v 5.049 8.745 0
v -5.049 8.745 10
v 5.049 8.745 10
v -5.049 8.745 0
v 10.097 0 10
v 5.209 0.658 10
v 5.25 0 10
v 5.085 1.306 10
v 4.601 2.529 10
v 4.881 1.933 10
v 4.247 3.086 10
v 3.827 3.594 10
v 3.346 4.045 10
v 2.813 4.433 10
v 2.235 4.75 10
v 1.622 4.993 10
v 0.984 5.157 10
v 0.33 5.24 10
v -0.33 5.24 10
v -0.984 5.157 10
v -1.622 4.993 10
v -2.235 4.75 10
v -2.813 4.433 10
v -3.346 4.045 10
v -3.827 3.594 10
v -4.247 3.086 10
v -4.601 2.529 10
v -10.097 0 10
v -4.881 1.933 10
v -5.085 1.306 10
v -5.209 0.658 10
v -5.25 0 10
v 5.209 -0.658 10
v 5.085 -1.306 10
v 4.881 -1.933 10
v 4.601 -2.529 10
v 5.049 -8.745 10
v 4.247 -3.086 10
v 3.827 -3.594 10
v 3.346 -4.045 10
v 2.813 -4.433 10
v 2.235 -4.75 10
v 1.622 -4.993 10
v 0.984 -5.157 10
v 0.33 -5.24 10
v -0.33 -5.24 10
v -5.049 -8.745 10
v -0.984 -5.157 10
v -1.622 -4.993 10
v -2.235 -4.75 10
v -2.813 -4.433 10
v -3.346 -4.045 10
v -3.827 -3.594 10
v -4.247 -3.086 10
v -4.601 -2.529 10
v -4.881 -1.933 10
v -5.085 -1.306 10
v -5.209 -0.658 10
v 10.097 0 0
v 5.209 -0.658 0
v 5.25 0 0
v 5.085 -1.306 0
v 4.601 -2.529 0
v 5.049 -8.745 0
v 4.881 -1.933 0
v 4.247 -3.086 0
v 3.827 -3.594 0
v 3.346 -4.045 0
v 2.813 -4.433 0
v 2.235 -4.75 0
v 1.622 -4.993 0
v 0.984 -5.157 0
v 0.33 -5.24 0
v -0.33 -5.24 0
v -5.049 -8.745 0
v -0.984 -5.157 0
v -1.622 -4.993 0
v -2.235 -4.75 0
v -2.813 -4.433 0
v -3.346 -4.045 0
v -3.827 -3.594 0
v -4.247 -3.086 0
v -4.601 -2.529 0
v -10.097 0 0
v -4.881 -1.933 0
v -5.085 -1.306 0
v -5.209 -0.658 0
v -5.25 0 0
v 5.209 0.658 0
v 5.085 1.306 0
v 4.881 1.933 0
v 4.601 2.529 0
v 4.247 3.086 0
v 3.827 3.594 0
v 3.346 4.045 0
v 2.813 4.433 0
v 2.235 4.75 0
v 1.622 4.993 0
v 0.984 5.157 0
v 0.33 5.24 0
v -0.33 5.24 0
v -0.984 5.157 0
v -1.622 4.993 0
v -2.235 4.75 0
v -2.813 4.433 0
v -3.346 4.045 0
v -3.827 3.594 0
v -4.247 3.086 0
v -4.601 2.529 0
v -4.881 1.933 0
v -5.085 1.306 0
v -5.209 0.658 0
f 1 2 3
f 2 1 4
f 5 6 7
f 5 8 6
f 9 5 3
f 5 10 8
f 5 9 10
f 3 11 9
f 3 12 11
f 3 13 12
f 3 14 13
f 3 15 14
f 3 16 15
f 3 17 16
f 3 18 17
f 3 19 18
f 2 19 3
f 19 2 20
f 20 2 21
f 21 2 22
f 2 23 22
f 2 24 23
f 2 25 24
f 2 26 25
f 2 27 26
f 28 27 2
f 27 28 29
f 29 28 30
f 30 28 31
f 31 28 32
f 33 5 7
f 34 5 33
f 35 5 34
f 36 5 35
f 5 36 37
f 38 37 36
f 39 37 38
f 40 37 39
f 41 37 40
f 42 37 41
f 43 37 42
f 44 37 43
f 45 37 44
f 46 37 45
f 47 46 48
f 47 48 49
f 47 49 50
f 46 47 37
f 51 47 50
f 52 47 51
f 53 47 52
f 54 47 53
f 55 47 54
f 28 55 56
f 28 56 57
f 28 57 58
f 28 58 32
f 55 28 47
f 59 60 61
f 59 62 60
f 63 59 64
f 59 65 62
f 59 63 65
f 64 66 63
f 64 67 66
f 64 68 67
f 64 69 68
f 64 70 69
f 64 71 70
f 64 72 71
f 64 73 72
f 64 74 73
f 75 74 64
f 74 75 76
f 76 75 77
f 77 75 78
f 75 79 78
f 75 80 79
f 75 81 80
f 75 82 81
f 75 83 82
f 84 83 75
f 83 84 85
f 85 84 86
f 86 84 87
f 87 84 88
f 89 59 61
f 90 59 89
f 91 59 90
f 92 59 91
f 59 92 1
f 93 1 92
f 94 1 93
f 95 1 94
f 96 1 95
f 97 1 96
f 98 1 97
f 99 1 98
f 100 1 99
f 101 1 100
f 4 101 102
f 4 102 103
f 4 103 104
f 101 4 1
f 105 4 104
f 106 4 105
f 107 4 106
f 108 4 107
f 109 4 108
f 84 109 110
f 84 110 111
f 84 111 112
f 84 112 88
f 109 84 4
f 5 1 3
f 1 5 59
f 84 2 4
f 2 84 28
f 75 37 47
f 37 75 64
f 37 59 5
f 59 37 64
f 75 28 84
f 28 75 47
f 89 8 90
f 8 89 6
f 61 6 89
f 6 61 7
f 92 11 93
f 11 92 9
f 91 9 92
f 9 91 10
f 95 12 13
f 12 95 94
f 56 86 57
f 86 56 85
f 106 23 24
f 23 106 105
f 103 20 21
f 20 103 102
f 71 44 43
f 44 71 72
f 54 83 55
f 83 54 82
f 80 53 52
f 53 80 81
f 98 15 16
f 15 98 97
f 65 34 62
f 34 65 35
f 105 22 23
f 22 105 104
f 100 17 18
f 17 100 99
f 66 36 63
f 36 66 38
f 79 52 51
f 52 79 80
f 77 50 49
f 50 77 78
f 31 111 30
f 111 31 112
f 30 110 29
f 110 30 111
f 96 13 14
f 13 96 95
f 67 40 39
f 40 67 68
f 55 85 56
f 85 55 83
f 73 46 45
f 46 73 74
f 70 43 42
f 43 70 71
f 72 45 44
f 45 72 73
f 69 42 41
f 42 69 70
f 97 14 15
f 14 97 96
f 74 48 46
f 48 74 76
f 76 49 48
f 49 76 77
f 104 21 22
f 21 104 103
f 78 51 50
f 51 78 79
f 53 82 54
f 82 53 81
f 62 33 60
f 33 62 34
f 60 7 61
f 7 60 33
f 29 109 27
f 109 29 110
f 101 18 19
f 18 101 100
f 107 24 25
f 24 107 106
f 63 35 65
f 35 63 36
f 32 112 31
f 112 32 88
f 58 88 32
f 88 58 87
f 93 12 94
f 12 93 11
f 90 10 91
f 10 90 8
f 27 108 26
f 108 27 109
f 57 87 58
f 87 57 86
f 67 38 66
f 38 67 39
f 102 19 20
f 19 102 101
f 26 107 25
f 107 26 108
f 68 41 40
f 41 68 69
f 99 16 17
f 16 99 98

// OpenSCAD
$fn = 50;


difference() {
	union() {
		translate(v = [0, 0, 0]) {
			rotate(a = [0, 0, 0]) {
				difference() {
					union() {
						linear_extrude(height = 10) {
							polygon(points = [[10.0975000000, 0.0000000000], [5.0487500000, 8.7446915147], [-5.0487500000, 8.7446915147], [-10.0975000000, 0.0000000000], [-5.0487500000, -8.7446915147], [5.0487500000, -8.7446915147]]);
						}
					}
					union();
				}
			}
		}
	}
	union() {
		cylinder(h = 100, r = 5.2500000000);
	}
}
